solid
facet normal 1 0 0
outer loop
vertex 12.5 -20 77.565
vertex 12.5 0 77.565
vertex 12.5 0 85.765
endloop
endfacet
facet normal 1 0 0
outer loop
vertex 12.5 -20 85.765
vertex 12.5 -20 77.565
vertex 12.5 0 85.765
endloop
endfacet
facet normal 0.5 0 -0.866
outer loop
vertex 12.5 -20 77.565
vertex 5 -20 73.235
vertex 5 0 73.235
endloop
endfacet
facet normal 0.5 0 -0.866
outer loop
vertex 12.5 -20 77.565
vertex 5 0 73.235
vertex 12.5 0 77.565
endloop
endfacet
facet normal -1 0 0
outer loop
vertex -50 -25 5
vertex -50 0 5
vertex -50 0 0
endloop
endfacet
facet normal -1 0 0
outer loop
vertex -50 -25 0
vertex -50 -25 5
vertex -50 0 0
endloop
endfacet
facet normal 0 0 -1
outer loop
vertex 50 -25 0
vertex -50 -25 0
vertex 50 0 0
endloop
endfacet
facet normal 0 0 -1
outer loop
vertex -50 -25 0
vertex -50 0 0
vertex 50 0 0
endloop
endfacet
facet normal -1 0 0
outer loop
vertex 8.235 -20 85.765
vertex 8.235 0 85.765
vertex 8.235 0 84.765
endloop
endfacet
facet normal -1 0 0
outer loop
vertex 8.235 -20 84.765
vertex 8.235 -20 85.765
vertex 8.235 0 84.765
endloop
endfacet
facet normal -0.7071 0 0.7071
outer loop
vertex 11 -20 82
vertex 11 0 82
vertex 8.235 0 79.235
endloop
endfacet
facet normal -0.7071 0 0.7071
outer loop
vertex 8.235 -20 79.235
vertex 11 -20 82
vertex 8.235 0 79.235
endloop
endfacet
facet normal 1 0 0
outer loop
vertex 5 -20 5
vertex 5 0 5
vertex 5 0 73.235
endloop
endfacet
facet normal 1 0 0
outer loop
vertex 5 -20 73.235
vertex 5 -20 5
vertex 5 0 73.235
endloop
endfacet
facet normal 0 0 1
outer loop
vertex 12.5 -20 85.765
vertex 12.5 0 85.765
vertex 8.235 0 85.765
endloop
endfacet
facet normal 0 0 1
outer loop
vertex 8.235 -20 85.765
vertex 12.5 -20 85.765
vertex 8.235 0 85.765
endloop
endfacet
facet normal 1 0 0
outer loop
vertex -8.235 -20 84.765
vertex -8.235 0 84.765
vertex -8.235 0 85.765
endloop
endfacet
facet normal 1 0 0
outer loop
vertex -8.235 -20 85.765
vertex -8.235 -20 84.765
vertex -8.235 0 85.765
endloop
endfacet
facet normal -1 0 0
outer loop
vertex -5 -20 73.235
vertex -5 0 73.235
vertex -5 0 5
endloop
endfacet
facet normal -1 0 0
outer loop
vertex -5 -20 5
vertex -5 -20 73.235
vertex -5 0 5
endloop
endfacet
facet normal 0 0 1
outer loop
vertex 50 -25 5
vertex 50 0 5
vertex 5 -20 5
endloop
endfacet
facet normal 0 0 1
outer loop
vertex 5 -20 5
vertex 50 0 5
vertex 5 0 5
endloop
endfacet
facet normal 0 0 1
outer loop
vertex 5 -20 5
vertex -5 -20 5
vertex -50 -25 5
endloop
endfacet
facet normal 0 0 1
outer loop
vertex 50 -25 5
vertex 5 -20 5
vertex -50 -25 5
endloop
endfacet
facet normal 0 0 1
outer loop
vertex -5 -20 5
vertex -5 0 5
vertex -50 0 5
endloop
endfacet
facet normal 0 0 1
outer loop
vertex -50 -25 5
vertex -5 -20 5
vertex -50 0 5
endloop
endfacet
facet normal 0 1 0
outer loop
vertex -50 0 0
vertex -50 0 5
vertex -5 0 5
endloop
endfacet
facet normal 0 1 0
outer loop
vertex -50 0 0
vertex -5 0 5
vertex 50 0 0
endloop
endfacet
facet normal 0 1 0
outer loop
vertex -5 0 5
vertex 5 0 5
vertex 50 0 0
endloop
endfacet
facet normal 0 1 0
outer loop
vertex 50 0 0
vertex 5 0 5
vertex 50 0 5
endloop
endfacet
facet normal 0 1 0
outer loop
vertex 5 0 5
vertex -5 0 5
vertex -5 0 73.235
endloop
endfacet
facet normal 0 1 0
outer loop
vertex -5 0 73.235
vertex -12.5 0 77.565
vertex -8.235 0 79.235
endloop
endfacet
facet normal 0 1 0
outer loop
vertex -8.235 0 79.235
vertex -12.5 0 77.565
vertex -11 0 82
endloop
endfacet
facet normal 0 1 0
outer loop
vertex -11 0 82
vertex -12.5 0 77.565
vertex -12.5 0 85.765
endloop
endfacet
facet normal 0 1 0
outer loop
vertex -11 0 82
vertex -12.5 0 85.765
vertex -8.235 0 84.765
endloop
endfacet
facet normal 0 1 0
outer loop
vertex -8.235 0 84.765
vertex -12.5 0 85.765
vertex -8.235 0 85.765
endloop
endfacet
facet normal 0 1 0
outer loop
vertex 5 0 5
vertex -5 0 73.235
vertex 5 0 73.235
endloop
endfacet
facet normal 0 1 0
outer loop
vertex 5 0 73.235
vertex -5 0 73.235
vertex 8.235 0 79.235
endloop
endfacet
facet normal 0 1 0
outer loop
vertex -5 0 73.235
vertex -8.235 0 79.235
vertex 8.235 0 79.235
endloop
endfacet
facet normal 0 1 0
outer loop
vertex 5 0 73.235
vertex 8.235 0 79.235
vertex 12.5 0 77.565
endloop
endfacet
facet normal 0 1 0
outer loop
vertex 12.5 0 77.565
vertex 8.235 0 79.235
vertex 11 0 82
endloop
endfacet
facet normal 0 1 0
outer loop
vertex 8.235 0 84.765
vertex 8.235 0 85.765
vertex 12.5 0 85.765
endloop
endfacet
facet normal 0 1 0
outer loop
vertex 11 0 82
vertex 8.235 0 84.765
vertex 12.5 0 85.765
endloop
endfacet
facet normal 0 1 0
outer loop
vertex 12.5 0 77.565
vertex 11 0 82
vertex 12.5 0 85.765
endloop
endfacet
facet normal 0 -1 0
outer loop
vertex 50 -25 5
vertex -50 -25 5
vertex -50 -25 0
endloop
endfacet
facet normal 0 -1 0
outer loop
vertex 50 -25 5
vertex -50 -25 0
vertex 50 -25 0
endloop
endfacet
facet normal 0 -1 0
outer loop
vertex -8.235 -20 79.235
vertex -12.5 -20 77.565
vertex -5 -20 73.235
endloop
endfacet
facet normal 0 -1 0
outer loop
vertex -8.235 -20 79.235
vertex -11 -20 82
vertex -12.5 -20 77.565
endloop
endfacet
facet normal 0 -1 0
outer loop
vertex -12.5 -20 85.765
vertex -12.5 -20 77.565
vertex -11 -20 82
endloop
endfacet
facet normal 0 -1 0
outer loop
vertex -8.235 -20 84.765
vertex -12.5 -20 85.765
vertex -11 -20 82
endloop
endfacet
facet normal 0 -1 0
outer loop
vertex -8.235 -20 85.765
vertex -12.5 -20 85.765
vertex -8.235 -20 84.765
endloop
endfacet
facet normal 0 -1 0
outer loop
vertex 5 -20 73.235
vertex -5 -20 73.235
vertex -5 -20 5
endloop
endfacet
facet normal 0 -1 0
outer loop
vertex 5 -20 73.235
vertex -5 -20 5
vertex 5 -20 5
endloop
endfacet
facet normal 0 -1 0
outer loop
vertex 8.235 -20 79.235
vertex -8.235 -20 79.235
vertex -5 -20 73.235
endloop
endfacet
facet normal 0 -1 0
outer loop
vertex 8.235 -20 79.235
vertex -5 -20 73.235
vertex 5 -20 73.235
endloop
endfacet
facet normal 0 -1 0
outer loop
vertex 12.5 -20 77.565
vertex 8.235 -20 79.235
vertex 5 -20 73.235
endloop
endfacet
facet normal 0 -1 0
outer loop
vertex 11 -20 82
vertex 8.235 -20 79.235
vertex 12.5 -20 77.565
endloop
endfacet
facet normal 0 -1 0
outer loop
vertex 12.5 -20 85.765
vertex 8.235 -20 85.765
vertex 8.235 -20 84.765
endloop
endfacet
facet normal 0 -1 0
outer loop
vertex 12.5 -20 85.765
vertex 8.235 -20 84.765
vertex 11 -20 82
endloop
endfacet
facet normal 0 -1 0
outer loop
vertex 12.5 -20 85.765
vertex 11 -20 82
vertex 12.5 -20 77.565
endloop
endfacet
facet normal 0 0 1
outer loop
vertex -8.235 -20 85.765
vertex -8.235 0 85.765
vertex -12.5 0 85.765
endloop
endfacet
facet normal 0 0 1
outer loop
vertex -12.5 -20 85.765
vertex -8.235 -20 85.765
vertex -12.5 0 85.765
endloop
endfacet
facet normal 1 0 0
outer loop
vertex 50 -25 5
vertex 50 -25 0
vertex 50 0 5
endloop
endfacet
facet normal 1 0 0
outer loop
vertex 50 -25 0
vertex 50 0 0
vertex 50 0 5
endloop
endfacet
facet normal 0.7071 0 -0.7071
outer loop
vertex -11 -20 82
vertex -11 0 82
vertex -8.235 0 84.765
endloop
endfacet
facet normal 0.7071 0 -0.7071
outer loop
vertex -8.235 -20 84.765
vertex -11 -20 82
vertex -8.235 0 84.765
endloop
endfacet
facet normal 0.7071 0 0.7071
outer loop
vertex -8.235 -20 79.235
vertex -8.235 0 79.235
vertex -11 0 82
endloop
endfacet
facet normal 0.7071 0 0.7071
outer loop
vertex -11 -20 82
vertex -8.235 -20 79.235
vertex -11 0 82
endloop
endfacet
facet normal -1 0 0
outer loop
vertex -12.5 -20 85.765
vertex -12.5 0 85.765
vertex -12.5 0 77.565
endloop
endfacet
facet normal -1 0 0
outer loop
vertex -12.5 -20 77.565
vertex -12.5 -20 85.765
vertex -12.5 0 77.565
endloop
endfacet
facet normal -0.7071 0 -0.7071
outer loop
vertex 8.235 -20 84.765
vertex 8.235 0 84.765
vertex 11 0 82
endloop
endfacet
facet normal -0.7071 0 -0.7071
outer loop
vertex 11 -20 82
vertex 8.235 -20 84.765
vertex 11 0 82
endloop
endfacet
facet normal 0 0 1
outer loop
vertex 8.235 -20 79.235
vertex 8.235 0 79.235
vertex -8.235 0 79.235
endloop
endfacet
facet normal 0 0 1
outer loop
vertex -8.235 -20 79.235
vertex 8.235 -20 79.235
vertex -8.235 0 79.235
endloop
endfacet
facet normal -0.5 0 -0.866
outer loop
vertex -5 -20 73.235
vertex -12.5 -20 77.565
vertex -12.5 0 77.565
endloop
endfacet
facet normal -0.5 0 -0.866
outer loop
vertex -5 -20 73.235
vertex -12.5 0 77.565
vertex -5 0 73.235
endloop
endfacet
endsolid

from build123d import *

# Parameters (mm, degrees)
F1_DEPTH = 20
F3_DEPTH = 5


with BuildPart() as f1:
    # F0 (on Front) → F1 (new body)
    with BuildSketch(Plane.XZ):
        Polygon((-50, 5), (-50, 0), (50, 0), (50, 5), (5, 5), (-5, 5), align=None)
        Polygon((-5, 73.235), (-5, 5), (5, 5), (5, 73.235), (12.5, 77.565127), (12.5, 85.765), (8.235, 85.765), (8.235, 84.765), (11, 82), (8.235, 79.235), (0, 79.235), (-8.235, 79.235), (-11, 82), (-8.235, 84.765), (-8.235, 85.765), (-12.5, 85.765), (-12.5, 77.565127), align=None)
    extrude(amount=F1_DEPTH)

    # F2 (on face) → F3 (join)
    with BuildSketch(Plane.XZ.offset(20)):
        Polygon((-5, 5), (-50, 5), (-50, 0), (50, 0), (50, 5), (5, 5), align=None)
    extrude(amount=F3_DEPTH)


solid = f1.part
